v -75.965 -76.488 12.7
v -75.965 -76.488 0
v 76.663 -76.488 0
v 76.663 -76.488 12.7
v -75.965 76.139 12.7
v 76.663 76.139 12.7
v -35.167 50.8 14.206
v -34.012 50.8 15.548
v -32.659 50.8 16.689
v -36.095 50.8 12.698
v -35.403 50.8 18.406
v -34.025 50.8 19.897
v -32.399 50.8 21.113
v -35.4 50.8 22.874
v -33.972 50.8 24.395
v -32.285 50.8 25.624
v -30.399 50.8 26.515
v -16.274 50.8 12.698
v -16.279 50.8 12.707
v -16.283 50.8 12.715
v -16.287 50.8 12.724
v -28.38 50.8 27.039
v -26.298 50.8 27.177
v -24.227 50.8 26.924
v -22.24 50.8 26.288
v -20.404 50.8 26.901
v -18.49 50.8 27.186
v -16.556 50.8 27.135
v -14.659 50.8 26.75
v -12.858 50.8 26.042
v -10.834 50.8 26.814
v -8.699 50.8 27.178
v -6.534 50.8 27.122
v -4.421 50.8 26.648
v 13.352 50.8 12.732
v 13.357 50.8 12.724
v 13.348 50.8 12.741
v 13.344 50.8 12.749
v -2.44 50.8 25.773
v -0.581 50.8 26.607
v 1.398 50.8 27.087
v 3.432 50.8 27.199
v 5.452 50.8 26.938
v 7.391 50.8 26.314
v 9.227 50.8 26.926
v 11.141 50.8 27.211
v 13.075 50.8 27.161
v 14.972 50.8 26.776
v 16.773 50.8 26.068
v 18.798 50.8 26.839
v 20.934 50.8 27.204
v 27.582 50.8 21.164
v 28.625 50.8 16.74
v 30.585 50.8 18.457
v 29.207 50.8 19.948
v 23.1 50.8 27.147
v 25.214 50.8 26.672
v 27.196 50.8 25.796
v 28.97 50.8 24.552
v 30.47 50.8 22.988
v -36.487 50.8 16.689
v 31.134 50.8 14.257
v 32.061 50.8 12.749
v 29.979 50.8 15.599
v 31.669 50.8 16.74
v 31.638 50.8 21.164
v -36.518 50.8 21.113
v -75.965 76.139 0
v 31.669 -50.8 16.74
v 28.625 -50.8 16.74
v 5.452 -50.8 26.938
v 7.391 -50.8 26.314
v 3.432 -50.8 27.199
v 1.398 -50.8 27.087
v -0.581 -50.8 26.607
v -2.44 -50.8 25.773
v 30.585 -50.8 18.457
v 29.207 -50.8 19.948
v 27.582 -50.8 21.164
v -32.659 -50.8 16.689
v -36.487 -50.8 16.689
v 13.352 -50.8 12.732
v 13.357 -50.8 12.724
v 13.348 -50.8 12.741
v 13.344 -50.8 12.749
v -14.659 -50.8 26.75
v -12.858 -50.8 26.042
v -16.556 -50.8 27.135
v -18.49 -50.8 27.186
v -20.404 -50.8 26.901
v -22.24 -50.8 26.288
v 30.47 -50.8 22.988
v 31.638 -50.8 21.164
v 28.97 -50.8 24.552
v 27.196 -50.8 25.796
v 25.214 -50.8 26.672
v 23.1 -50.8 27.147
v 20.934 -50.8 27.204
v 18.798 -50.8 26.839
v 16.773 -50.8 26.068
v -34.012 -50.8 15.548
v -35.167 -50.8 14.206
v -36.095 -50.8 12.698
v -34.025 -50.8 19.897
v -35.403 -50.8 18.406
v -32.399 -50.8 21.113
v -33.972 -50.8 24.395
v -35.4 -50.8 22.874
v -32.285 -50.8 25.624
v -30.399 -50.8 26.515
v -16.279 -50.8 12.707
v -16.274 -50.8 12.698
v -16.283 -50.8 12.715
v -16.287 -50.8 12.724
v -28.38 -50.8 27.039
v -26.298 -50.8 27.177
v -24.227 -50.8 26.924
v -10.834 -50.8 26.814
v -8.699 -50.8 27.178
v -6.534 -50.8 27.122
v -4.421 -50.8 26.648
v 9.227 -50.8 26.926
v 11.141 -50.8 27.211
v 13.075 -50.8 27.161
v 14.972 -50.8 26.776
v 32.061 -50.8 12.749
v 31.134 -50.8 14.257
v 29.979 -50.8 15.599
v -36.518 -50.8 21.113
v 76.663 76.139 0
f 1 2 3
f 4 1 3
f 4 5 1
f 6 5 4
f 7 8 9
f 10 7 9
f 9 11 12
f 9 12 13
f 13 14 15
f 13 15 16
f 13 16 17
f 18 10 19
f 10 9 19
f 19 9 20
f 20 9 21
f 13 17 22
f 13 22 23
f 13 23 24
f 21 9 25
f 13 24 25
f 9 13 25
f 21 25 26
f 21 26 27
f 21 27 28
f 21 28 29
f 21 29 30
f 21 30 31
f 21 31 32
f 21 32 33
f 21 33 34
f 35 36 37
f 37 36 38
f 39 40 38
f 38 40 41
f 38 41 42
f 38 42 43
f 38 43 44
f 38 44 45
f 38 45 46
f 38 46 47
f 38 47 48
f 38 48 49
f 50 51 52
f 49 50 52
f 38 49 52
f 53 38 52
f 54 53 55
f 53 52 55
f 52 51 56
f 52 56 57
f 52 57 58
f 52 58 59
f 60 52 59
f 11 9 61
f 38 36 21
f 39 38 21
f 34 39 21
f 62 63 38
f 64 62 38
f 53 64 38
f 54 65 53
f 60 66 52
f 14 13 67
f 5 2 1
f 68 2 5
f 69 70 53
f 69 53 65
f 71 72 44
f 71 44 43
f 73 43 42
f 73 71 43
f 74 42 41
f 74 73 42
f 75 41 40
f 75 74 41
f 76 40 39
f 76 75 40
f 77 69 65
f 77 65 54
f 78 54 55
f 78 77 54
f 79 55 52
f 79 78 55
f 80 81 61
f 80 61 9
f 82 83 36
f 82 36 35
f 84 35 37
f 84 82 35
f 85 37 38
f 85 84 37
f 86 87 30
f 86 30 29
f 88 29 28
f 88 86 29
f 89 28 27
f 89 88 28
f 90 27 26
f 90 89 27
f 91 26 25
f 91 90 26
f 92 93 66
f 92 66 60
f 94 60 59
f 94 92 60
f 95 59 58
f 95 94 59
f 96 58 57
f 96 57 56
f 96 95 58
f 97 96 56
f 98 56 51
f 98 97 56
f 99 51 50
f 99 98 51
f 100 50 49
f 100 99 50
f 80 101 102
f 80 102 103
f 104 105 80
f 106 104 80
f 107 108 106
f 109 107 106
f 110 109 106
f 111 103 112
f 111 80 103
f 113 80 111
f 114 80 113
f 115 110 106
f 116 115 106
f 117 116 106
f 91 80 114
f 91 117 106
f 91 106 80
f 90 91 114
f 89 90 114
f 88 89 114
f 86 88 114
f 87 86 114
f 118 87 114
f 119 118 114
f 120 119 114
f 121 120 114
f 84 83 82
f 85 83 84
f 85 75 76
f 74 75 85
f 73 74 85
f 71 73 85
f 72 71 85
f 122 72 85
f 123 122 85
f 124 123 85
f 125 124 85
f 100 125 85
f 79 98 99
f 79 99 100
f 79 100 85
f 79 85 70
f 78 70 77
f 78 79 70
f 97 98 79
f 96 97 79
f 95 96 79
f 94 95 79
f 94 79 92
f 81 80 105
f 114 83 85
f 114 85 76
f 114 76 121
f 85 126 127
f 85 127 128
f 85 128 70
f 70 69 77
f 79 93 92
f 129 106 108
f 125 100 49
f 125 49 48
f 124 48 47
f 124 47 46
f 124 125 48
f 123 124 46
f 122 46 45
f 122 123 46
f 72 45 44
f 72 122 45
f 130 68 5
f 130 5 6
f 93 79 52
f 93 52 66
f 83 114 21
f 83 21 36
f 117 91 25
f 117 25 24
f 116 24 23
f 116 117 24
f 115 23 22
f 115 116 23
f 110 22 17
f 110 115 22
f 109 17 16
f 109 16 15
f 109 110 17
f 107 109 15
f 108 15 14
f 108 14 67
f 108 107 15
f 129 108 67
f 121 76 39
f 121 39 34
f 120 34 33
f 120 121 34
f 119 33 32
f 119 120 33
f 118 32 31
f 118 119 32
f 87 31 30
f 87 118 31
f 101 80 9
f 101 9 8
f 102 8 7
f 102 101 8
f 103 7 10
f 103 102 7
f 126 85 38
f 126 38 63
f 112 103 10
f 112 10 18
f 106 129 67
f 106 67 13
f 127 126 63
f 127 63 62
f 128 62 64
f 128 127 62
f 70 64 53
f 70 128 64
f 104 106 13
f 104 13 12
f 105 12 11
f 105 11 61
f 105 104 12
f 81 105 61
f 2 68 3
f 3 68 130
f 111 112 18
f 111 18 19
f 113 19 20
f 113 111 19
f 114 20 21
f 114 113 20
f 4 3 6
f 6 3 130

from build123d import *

# Parameters (mm, degrees)
F0_W     = 152.6275277138
F0_H     = 152.6275202632
F1_DEPTH = 12.7
F4_DEPTH = 101.6


with BuildPart() as f1:
    # F0 (on Top) → F1 (new body)
    with BuildSketch(Plane.XY):
        with Locations((0.3492608666, -0.1746304333)):
            Rectangle(F0_W, F0_H)
    extrude(amount=F1_DEPTH)


with BuildPart() as f4:
    # F3 (on offset) → F4 (new body)
    with BuildSketch(Plane.XZ.offset(50.8)):
        with BuildLine():
            ThreePointArc((-23.899851243, 16.6892502457), (-25.8361923758, 14.9089254969), (-27.3004854098, 12.7237895504))
            Line((-27.3004854098, 12.7237895504), (-17.3901738599, 12.7237895504))
            ThreePointArc((-17.3901738599, 12.7237895504), (-15.911695575, 14.925434135), (-13.9541862477, 16.7146502063))
            Line((-13.9541862477, 16.7146502063), (-16.6790850963, 16.7146502063))
            ThreePointArc((-16.6790850963, 16.7146502063), (-16.6725748067, 16.7019543949), (-16.6660808027, 16.6892502457))
            Line((-16.6660808027, 16.6892502457), (-19.7101641502, 16.6892502457))
            Line((-19.7101641502, 16.6892502457), (-23.899851243, 16.6892502457))
        make_face()
        with BuildLine():
            Line((-17.3901738599, 12.7237895504), (-27.3004854098, 12.7237895504))
            ThreePointArc((-27.3004854098, 12.7237895504), (-25.8361923758, 14.9089254969), (-23.899851243, 16.6892502457))
            Line((-23.899851243, 16.6892502457), (-32.6588120256, 16.6892502457))
            ThreePointArc((-32.6588120256, 16.6892502457), (-34.6163213529, 14.9000341745), (-36.0947996378, 12.6983895898))
            Line((-36.0947996378, 12.6983895898), (-16.274176538, 12.6983895898))
            ThreePointArc((-16.274176538, 12.6983895898), (-16.280670542, 12.711093739), (-16.2871808316, 12.7237895504))
            Line((-16.2871808316, 12.7237895504), (-17.3901738599, 12.7237895504))
        make_face()
        with BuildLine():
            ThreePointArc((-13.9541862477, 16.7146502063), (-15.911695575, 14.925434135), (-17.3901738599, 12.7237895504))
            Line((-17.3901738599, 12.7237895504), (-16.2871808316, 12.7237895504))
            Line((-16.2871808316, 12.7237895504), (-7.47986231, 12.7237895504))
            Line((-7.47986231, 12.7237895504), (-6.4638601616, 12.7237895504))
            ThreePointArc((-6.4638601616, 12.7237895504), (-4.9853818767, 14.925434135), (-3.0278725494, 16.7146502063))
            Line((-3.0278725494, 16.7146502063), (-6.8557644263, 16.7146502063))
            Line((-6.8557644263, 16.7146502063), (-7.8717665747, 16.7146502063))
            Line((-7.8717665747, 16.7146502063), (-13.9541862477, 16.7146502063))
        make_face()
        with BuildLine():
            ThreePointArc((-23.8644977976, 16.7146502063), (-23.8821869424, 16.701967516), (-23.899851243, 16.6892502457))
            Line((-23.899851243, 16.6892502457), (-19.7101641502, 16.6892502457))
            ThreePointArc((-19.7101641502, 16.6892502457), (-19.7279755385, 16.7019677558), (-19.7458119078, 16.7146502063))
            Line((-19.7458119078, 16.7146502063), (-23.8644977976, 16.7146502063))
        make_face()
        with BuildLine():
            Line((-32.6588120256, 16.6892502457), (-23.899851243, 16.6892502457))
            ThreePointArc((-23.899851243, 16.6892502457), (-23.8821869424, 16.701967516), (-23.8644977976, 16.7146502063))
            Line((-23.8644977976, 16.7146502063), (-27.6923896745, 16.7146502063))
            ThreePointArc((-27.6923896745, 16.7146502063), (-25.9698422833, 19.1904969058), (-23.6456289265, 21.1127400398))
            Line((-23.6456289265, 21.1127400398), (-32.3987820079, 21.1127400398))
            ThreePointArc((-32.3987820079, 21.1127400398), (-34.7477623291, 19.1828756115), (-36.4867039025, 16.6892502457))
            Line((-36.4867039025, 16.6892502457), (-32.6588120256, 16.6892502457))
        make_face()
        with BuildLine():
            Line((-16.6790850963, 16.7146502063), (-13.9541862477, 16.7146502063))
            Line((-13.9541862477, 16.7146502063), (-7.8717665747, 16.7146502063))
            Line((-7.8717665747, 16.7146502063), (-6.8557644263, 16.7146502063))
            ThreePointArc((-6.8557644263, 16.7146502063), (-5.1168228529, 19.2082755721), (-2.7678425317, 21.1381400004))
            Line((-2.7678425317, 21.1381400004), (-6.8870568648, 21.1381400004))
            Line((-6.8870568648, 21.1381400004), (-7.9030590132, 21.1381400004))
            Line((-7.9030590132, 21.1381400004), (-13.69415623, 21.1381400004))
            ThreePointArc((-13.69415623, 21.1381400004), (-16.0431365512, 19.2082755721), (-17.7820781246, 16.7146502063))
            Line((-17.7820781246, 16.7146502063), (-16.6790850963, 16.7146502063))
        make_face()
        with BuildLine():
            ThreePointArc((-19.7458119078, 16.7146502063), (-19.7279755385, 16.7019677558), (-19.7101641502, 16.6892502457))
            Line((-19.7101641502, 16.6892502457), (-16.6660808027, 16.6892502457))
            ThreePointArc((-16.6660808027, 16.6892502457), (-16.6725748067, 16.7019543949), (-16.6790850963, 16.7146502063))
            Line((-16.6790850963, 16.7146502063), (-17.7820781246, 16.7146502063))
            Line((-17.7820781246, 16.7146502063), (-19.7458119078, 16.7146502063))
        make_face()
        with BuildLine():
            Line((-27.6923896745, 16.7146502063), (-23.8644977976, 16.7146502063))
            Line((-23.8644977976, 16.7146502063), (-19.7458119078, 16.7146502063))
            Line((-19.7458119078, 16.7146502063), (-17.7820781246, 16.7146502063))
            ThreePointArc((-17.7820781246, 16.7146502063), (-16.0431365512, 19.2082755721), (-13.69415623, 21.1381400004))
            Line((-13.69415623, 21.1381400004), (-16.7103775348, 21.1381400004))
            ThreePointArc((-16.7103775348, 21.1381400004), (-16.7038672452, 21.1254441891), (-16.6973732412, 21.1127400398))
            Line((-16.6973732412, 21.1127400398), (-20.7540026972, 21.1127400398))
            Line((-20.7540026972, 21.1127400398), (-23.6456289265, 21.1127400398))
            ThreePointArc((-23.6456289265, 21.1127400398), (-25.9698422833, 19.1904969058), (-27.6923896745, 16.7146502063))
        make_face()
        with BuildLine():
            ThreePointArc((-3.0278725494, 16.7146502063), (-4.9853818767, 14.925434135), (-6.4638601616, 12.7237895504))
            Line((-6.4638601616, 12.7237895504), (2.4304492399, 12.7237895504))
            Line((2.4304492399, 12.7237895504), (13.3567629382, 12.7237895504))
            ThreePointArc((13.3567629382, 12.7237895504), (13.3502689342, 12.7364936996), (13.3437586446, 12.7491895109))
            Line((13.3437586446, 12.7491895109), (12.2407656163, 12.7491895109))
            Line((12.2407656163, 12.7491895109), (2.3304540664, 12.7491895109))
            ThreePointArc((2.3304540664, 12.7491895109), (3.7947471004, 14.9343254574), (5.7310882332, 16.7146502063))
            Line((5.7310882332, 16.7146502063), (2.0385449752, 16.7146502063))
            Line((2.0385449752, 16.7146502063), (-3.0278725494, 16.7146502063))
        make_face()
        with BuildLine():
            ThreePointArc((-2.7678425317, 21.1381400004), (-5.1168228529, 19.2082755721), (-6.8557644263, 16.7146502063))
            Line((-6.8557644263, 16.7146502063), (-3.0278725494, 16.7146502063))
            Line((-3.0278725494, 16.7146502063), (2.0385449752, 16.7146502063))
            ThreePointArc((2.0385449752, 16.7146502063), (2.0320509712, 16.7273543555), (2.0255406816, 16.7400501668))
            Line((2.0255406816, 16.7400501668), (1.9385498017, 16.7400501668))
            ThreePointArc((1.9385498017, 16.7400501668), (1.9601396942, 16.7821320004), (1.9819082764, 16.8241216778))
            ThreePointArc((1.9819082764, 16.8241216778), (3.6931960459, 19.2506339908), (5.9853105497, 21.1381400004))
            Line((5.9853105497, 21.1381400004), (2.0072525367, 21.1381400004))
            Line((2.0072525367, 21.1381400004), (-2.7678425317, 21.1381400004))
        make_face()
        with BuildLine():
            Line((-36.517996341, 21.1127400398), (-32.3987820079, 21.1127400398))
            Line((-32.3987820079, 21.1127400398), (-23.6456289265, 21.1127400398))
            ThreePointArc((-23.6456289265, 21.1127400398), (-23.6250621552, 21.1254623865), (-23.6044677799, 21.1381400004))
            Line((-23.6044677799, 21.1381400004), (-27.723682113, 21.1381400004))
            ThreePointArc((-27.723682113, 21.1381400004), (-25.4303236651, 24.190658722), (-22.2400470078, 26.2881568427))
            ThreePointArc((-22.2400470078, 26.2881568427), (-30.3993259782, 26.515265819), (-36.517996341, 21.1127400398))
        make_face()
        with BuildLine():
            ThreePointArc((-23.6044677799, 21.1381400004), (-23.6250621552, 21.1254623865), (-23.6456289265, 21.1127400398))
            Line((-23.6456289265, 21.1127400398), (-20.7540026972, 21.1127400398))
            ThreePointArc((-20.7540026972, 21.1127400398), (-20.7747717042, 21.1254627675), (-20.7955685121, 21.1381400004))
            Line((-20.7955685121, 21.1381400004), (-23.6044677799, 21.1381400004))
        make_face()
        with BuildLine():
            Line((-16.7103775348, 21.1381400004), (-13.69415623, 21.1381400004))
            Line((-13.69415623, 21.1381400004), (-7.9030590132, 21.1381400004))
            Line((-7.9030590132, 21.1381400004), (-6.8870568648, 21.1381400004))
            ThreePointArc((-6.8870568648, 21.1381400004), (-5.0052271885, 23.7835064069), (-2.439902164, 25.7730676333))
            ThreePointArc((-2.439902164, 25.7730676333), (-7.6155816808, 27.2029401673), (-12.8582147881, 26.0423403114))
            ThreePointArc((-12.8582147881, 26.0423403114), (-15.7298287727, 23.9883703542), (-17.8133705631, 21.1381400004))
            Line((-17.8133705631, 21.1381400004), (-16.7103775348, 21.1381400004))
        make_face()
        with BuildLine():
            Line((-6.8870568648, 21.1381400004), (-2.7678425317, 21.1381400004))
            Line((-2.7678425317, 21.1381400004), (2.0072525367, 21.1381400004))
            ThreePointArc((2.0072525367, 21.1381400004), (2.0007585327, 21.1508441496), (1.9942482431, 21.163539961))
            Line((1.9942482431, 21.163539961), (1.9072573632, 21.163539961))
            ThreePointArc((1.9072573632, 21.163539961), (1.9288472557, 21.2056217946), (1.9506158379, 21.247611472))
            ThreePointArc((1.9506158379, 21.247611472), (4.2351608696, 24.2483641482), (7.3908924684, 26.3135568032))
            ThreePointArc((7.3908924684, 26.3135568032), (2.4124579582, 27.1898767431), (-2.439902164, 25.7730676333))
            ThreePointArc((-2.439902164, 25.7730676333), (-5.0052271885, 23.7835064069), (-6.8870568648, 21.1381400004))
        make_face()
        with BuildLine():
            ThreePointArc((-20.7955685121, 21.1381400004), (-20.7747717042, 21.1254627675), (-20.7540026972, 21.1127400398))
            Line((-20.7540026972, 21.1127400398), (-16.6973732412, 21.1127400398))
            ThreePointArc((-16.6973732412, 21.1127400398), (-16.7038672452, 21.1254441891), (-16.7103775348, 21.1381400004))
            Line((-16.7103775348, 21.1381400004), (-17.8133705631, 21.1381400004))
            Line((-17.8133705631, 21.1381400004), (-20.7955685121, 21.1381400004))
        make_face()
        with BuildLine():
            Line((-27.723682113, 21.1381400004), (-23.6044677799, 21.1381400004))
            Line((-23.6044677799, 21.1381400004), (-20.7955685121, 21.1381400004))
            Line((-20.7955685121, 21.1381400004), (-17.8133705631, 21.1381400004))
            ThreePointArc((-17.8133705631, 21.1381400004), (-15.7298287727, 23.9883703542), (-12.8582147881, 26.0423403114))
            ThreePointArc((-12.8582147881, 26.0423403114), (-17.5219446851, 27.2028374115), (-22.2400470078, 26.2881568427))
            ThreePointArc((-22.2400470078, 26.2881568427), (-25.4303236651, 24.190658722), (-27.723682113, 21.1381400004))
        make_face()
        with BuildLine():
            ThreePointArc((2.0255406816, 16.7400501668), (2.0320509712, 16.7273543555), (2.0385449752, 16.7146502063))
            Line((2.0385449752, 16.7146502063), (5.7310882332, 16.7146502063))
            ThreePointArc((5.7310882332, 16.7146502063), (5.7487525338, 16.7273674766), (5.7664416786, 16.7400501668))
            Line((5.7664416786, 16.7400501668), (2.0255406816, 16.7400501668))
        make_face()
        with BuildLine():
            ThreePointArc((1.9942482431, 21.163539961), (2.0007585327, 21.1508441496), (2.0072525367, 21.1381400004))
            Line((2.0072525367, 21.1381400004), (5.9853105497, 21.1381400004))
            ThreePointArc((5.9853105497, 21.1381400004), (6.005877321, 21.1508623471), (6.0264716963, 21.163539961))
            Line((6.0264716963, 21.163539961), (1.9942482431, 21.163539961))
        make_face()
        with BuildLine():
            Line((12.2407656163, 12.7491895109), (13.3437586446, 12.7491895109))
            Line((13.3437586446, 12.7491895109), (22.1510771662, 12.7491895109))
            Line((22.1510771662, 12.7491895109), (32.0613887161, 12.7491895109))
            ThreePointArc((32.0613887161, 12.7491895109), (30.5829104312, 14.9508340956), (28.6254011039, 16.7400501668))
            Line((28.6254011039, 16.7400501668), (21.7591729015, 16.7400501668))
            Line((21.7591729015, 16.7400501668), (15.6767532285, 16.7400501668))
            ThreePointArc((15.6767532285, 16.7400501668), (13.7192439012, 14.9508340956), (12.2407656163, 12.7491895109))
        make_face()
        with BuildLine():
            Line((1.9385498017, 16.7400501668), (2.0255406816, 16.7400501668))
            ThreePointArc((2.0255406816, 16.7400501668), (2.0038139428, 16.7821323533), (1.9819082764, 16.8241216778))
            ThreePointArc((1.9819082764, 16.8241216778), (1.9601396942, 16.7821320004), (1.9385498017, 16.7400501668))
        make_face()
        with BuildLine():
            ThreePointArc((1.9819082764, 16.8241216778), (2.0038139428, 16.7821323533), (2.0255406816, 16.7400501668))
            Line((2.0255406816, 16.7400501668), (5.7664416786, 16.7400501668))
            Line((5.7664416786, 16.7400501668), (9.8851275684, 16.7400501668))
            Line((9.8851275684, 16.7400501668), (11.8488613516, 16.7400501668))
            ThreePointArc((11.8488613516, 16.7400501668), (13.587802925, 19.2336755327), (15.9367832462, 21.163539961))
            Line((15.9367832462, 21.163539961), (12.9205619414, 21.163539961))
            ThreePointArc((12.9205619414, 21.163539961), (12.927072231, 21.1508441496), (12.933566235, 21.1381400004))
            Line((12.933566235, 21.1381400004), (8.876936779, 21.1381400004))
            Line((8.876936779, 21.1381400004), (5.9853105497, 21.1381400004))
            ThreePointArc((5.9853105497, 21.1381400004), (3.6931960459, 19.2506339908), (1.9819082764, 16.8241216778))
        make_face()
        with BuildLine():
            ThreePointArc((5.7664416786, 16.7400501668), (5.7487525338, 16.7273674766), (5.7310882332, 16.7146502063))
            Line((5.7310882332, 16.7146502063), (9.920775326, 16.7146502063))
            ThreePointArc((9.920775326, 16.7146502063), (9.9029639377, 16.7273677164), (9.8851275684, 16.7400501668))
            Line((9.8851275684, 16.7400501668), (5.7664416786, 16.7400501668))
        make_face()
        with BuildLine():
            Line((9.920775326, 16.7146502063), (5.7310882332, 16.7146502063))
            ThreePointArc((5.7310882332, 16.7146502063), (3.7947471004, 14.9343254574), (2.3304540664, 12.7491895109))
            Line((2.3304540664, 12.7491895109), (12.2407656163, 12.7491895109))
            ThreePointArc((12.2407656163, 12.7491895109), (13.7192439012, 14.9508340956), (15.6767532285, 16.7400501668))
            Line((15.6767532285, 16.7400501668), (12.9518543799, 16.7400501668))
            ThreePointArc((12.9518543799, 16.7400501668), (12.9583646695, 16.7273543555), (12.9648586735, 16.7146502063))
            Line((12.9648586735, 16.7146502063), (9.920775326, 16.7146502063))
        make_face()
        with BuildLine():
            Line((1.9072573632, 21.163539961), (1.9942482431, 21.163539961))
            ThreePointArc((1.9942482431, 21.163539961), (1.9725215042, 21.2056221474), (1.9506158379, 21.247611472))
            ThreePointArc((1.9506158379, 21.247611472), (1.9288472557, 21.2056217946), (1.9072573632, 21.163539961))
        make_face()
        with BuildLine():
            ThreePointArc((1.9506158379, 21.247611472), (1.9725215042, 21.2056221474), (1.9942482431, 21.163539961))
            Line((1.9942482431, 21.163539961), (6.0264716963, 21.163539961))
            Line((6.0264716963, 21.163539961), (8.8353709641, 21.163539961))
            Line((8.8353709641, 21.163539961), (11.8175689131, 21.163539961))
            ThreePointArc((11.8175689131, 21.163539961), (13.9011107034, 24.0137703148), (16.7727246881, 26.067740272))
            ThreePointArc((16.7727246881, 26.067740272), (12.1089947911, 27.2282373721), (7.3908924684, 26.3135568032))
            ThreePointArc((7.3908924684, 26.3135568032), (4.2351608696, 24.2483641482), (1.9506158379, 21.247611472))
        make_face()
        with BuildLine():
            ThreePointArc((6.0264716963, 21.163539961), (6.005877321, 21.1508623471), (5.9853105497, 21.1381400004))
            Line((5.9853105497, 21.1381400004), (8.876936779, 21.1381400004))
            ThreePointArc((8.876936779, 21.1381400004), (8.856167772, 21.150862728), (8.8353709641, 21.163539961))
            Line((8.8353709641, 21.163539961), (6.0264716963, 21.163539961))
        make_face()
        with BuildLine():
            ThreePointArc((9.8851275684, 16.7400501668), (9.9029639377, 16.7273677164), (9.920775326, 16.7146502063))
            Line((9.920775326, 16.7146502063), (12.9648586735, 16.7146502063))
            ThreePointArc((12.9648586735, 16.7146502063), (12.9583646695, 16.7273543555), (12.9518543799, 16.7400501668))
            Line((12.9518543799, 16.7400501668), (11.8488613516, 16.7400501668))
            Line((11.8488613516, 16.7400501668), (9.8851275684, 16.7400501668))
        make_face()
        with BuildLine():
            ThreePointArc((8.8353709641, 21.163539961), (8.856167772, 21.150862728), (8.876936779, 21.1381400004))
            Line((8.876936779, 21.1381400004), (12.933566235, 21.1381400004))
            ThreePointArc((12.933566235, 21.1381400004), (12.927072231, 21.1508441496), (12.9205619414, 21.163539961))
            Line((12.9205619414, 21.163539961), (11.8175689131, 21.163539961))
            Line((11.8175689131, 21.163539961), (8.8353709641, 21.163539961))
        make_face()
        with BuildLine():
            Line((12.9518543799, 16.7400501668), (15.6767532285, 16.7400501668))
            Line((15.6767532285, 16.7400501668), (21.7591729015, 16.7400501668))
            Line((21.7591729015, 16.7400501668), (28.6254011039, 16.7400501668))
            Line((28.6254011039, 16.7400501668), (31.6694844514, 16.7400501668))
            ThreePointArc((31.6694844514, 16.7400501668), (29.930542878, 19.2336755327), (27.5815625569, 21.163539961))
            Line((27.5815625569, 21.163539961), (21.727880463, 21.163539961))
            Line((21.727880463, 21.163539961), (15.9367832462, 21.163539961))
            ThreePointArc((15.9367832462, 21.163539961), (13.587802925, 19.2336755327), (11.8488613516, 16.7400501668))
            Line((11.8488613516, 16.7400501668), (12.9518543799, 16.7400501668))
        make_face()
        with BuildLine():
            ThreePointArc((31.6381920129, 21.163539961), (25.2137357901, 26.6719009504), (16.7727246881, 26.067740272))
            ThreePointArc((16.7727246881, 26.067740272), (13.9011107034, 24.0137703148), (11.8175689131, 21.163539961))
            Line((11.8175689131, 21.163539961), (12.9205619414, 21.163539961))
            Line((12.9205619414, 21.163539961), (15.9367832462, 21.163539961))
            Line((15.9367832462, 21.163539961), (21.727880463, 21.163539961))
            Line((21.727880463, 21.163539961), (27.5815625569, 21.163539961))
            Line((27.5815625569, 21.163539961), (31.6381920129, 21.163539961))
        make_face()
    extrude(amount=-F4_DEPTH)


solid = Compound([f1.part, f4.part])
